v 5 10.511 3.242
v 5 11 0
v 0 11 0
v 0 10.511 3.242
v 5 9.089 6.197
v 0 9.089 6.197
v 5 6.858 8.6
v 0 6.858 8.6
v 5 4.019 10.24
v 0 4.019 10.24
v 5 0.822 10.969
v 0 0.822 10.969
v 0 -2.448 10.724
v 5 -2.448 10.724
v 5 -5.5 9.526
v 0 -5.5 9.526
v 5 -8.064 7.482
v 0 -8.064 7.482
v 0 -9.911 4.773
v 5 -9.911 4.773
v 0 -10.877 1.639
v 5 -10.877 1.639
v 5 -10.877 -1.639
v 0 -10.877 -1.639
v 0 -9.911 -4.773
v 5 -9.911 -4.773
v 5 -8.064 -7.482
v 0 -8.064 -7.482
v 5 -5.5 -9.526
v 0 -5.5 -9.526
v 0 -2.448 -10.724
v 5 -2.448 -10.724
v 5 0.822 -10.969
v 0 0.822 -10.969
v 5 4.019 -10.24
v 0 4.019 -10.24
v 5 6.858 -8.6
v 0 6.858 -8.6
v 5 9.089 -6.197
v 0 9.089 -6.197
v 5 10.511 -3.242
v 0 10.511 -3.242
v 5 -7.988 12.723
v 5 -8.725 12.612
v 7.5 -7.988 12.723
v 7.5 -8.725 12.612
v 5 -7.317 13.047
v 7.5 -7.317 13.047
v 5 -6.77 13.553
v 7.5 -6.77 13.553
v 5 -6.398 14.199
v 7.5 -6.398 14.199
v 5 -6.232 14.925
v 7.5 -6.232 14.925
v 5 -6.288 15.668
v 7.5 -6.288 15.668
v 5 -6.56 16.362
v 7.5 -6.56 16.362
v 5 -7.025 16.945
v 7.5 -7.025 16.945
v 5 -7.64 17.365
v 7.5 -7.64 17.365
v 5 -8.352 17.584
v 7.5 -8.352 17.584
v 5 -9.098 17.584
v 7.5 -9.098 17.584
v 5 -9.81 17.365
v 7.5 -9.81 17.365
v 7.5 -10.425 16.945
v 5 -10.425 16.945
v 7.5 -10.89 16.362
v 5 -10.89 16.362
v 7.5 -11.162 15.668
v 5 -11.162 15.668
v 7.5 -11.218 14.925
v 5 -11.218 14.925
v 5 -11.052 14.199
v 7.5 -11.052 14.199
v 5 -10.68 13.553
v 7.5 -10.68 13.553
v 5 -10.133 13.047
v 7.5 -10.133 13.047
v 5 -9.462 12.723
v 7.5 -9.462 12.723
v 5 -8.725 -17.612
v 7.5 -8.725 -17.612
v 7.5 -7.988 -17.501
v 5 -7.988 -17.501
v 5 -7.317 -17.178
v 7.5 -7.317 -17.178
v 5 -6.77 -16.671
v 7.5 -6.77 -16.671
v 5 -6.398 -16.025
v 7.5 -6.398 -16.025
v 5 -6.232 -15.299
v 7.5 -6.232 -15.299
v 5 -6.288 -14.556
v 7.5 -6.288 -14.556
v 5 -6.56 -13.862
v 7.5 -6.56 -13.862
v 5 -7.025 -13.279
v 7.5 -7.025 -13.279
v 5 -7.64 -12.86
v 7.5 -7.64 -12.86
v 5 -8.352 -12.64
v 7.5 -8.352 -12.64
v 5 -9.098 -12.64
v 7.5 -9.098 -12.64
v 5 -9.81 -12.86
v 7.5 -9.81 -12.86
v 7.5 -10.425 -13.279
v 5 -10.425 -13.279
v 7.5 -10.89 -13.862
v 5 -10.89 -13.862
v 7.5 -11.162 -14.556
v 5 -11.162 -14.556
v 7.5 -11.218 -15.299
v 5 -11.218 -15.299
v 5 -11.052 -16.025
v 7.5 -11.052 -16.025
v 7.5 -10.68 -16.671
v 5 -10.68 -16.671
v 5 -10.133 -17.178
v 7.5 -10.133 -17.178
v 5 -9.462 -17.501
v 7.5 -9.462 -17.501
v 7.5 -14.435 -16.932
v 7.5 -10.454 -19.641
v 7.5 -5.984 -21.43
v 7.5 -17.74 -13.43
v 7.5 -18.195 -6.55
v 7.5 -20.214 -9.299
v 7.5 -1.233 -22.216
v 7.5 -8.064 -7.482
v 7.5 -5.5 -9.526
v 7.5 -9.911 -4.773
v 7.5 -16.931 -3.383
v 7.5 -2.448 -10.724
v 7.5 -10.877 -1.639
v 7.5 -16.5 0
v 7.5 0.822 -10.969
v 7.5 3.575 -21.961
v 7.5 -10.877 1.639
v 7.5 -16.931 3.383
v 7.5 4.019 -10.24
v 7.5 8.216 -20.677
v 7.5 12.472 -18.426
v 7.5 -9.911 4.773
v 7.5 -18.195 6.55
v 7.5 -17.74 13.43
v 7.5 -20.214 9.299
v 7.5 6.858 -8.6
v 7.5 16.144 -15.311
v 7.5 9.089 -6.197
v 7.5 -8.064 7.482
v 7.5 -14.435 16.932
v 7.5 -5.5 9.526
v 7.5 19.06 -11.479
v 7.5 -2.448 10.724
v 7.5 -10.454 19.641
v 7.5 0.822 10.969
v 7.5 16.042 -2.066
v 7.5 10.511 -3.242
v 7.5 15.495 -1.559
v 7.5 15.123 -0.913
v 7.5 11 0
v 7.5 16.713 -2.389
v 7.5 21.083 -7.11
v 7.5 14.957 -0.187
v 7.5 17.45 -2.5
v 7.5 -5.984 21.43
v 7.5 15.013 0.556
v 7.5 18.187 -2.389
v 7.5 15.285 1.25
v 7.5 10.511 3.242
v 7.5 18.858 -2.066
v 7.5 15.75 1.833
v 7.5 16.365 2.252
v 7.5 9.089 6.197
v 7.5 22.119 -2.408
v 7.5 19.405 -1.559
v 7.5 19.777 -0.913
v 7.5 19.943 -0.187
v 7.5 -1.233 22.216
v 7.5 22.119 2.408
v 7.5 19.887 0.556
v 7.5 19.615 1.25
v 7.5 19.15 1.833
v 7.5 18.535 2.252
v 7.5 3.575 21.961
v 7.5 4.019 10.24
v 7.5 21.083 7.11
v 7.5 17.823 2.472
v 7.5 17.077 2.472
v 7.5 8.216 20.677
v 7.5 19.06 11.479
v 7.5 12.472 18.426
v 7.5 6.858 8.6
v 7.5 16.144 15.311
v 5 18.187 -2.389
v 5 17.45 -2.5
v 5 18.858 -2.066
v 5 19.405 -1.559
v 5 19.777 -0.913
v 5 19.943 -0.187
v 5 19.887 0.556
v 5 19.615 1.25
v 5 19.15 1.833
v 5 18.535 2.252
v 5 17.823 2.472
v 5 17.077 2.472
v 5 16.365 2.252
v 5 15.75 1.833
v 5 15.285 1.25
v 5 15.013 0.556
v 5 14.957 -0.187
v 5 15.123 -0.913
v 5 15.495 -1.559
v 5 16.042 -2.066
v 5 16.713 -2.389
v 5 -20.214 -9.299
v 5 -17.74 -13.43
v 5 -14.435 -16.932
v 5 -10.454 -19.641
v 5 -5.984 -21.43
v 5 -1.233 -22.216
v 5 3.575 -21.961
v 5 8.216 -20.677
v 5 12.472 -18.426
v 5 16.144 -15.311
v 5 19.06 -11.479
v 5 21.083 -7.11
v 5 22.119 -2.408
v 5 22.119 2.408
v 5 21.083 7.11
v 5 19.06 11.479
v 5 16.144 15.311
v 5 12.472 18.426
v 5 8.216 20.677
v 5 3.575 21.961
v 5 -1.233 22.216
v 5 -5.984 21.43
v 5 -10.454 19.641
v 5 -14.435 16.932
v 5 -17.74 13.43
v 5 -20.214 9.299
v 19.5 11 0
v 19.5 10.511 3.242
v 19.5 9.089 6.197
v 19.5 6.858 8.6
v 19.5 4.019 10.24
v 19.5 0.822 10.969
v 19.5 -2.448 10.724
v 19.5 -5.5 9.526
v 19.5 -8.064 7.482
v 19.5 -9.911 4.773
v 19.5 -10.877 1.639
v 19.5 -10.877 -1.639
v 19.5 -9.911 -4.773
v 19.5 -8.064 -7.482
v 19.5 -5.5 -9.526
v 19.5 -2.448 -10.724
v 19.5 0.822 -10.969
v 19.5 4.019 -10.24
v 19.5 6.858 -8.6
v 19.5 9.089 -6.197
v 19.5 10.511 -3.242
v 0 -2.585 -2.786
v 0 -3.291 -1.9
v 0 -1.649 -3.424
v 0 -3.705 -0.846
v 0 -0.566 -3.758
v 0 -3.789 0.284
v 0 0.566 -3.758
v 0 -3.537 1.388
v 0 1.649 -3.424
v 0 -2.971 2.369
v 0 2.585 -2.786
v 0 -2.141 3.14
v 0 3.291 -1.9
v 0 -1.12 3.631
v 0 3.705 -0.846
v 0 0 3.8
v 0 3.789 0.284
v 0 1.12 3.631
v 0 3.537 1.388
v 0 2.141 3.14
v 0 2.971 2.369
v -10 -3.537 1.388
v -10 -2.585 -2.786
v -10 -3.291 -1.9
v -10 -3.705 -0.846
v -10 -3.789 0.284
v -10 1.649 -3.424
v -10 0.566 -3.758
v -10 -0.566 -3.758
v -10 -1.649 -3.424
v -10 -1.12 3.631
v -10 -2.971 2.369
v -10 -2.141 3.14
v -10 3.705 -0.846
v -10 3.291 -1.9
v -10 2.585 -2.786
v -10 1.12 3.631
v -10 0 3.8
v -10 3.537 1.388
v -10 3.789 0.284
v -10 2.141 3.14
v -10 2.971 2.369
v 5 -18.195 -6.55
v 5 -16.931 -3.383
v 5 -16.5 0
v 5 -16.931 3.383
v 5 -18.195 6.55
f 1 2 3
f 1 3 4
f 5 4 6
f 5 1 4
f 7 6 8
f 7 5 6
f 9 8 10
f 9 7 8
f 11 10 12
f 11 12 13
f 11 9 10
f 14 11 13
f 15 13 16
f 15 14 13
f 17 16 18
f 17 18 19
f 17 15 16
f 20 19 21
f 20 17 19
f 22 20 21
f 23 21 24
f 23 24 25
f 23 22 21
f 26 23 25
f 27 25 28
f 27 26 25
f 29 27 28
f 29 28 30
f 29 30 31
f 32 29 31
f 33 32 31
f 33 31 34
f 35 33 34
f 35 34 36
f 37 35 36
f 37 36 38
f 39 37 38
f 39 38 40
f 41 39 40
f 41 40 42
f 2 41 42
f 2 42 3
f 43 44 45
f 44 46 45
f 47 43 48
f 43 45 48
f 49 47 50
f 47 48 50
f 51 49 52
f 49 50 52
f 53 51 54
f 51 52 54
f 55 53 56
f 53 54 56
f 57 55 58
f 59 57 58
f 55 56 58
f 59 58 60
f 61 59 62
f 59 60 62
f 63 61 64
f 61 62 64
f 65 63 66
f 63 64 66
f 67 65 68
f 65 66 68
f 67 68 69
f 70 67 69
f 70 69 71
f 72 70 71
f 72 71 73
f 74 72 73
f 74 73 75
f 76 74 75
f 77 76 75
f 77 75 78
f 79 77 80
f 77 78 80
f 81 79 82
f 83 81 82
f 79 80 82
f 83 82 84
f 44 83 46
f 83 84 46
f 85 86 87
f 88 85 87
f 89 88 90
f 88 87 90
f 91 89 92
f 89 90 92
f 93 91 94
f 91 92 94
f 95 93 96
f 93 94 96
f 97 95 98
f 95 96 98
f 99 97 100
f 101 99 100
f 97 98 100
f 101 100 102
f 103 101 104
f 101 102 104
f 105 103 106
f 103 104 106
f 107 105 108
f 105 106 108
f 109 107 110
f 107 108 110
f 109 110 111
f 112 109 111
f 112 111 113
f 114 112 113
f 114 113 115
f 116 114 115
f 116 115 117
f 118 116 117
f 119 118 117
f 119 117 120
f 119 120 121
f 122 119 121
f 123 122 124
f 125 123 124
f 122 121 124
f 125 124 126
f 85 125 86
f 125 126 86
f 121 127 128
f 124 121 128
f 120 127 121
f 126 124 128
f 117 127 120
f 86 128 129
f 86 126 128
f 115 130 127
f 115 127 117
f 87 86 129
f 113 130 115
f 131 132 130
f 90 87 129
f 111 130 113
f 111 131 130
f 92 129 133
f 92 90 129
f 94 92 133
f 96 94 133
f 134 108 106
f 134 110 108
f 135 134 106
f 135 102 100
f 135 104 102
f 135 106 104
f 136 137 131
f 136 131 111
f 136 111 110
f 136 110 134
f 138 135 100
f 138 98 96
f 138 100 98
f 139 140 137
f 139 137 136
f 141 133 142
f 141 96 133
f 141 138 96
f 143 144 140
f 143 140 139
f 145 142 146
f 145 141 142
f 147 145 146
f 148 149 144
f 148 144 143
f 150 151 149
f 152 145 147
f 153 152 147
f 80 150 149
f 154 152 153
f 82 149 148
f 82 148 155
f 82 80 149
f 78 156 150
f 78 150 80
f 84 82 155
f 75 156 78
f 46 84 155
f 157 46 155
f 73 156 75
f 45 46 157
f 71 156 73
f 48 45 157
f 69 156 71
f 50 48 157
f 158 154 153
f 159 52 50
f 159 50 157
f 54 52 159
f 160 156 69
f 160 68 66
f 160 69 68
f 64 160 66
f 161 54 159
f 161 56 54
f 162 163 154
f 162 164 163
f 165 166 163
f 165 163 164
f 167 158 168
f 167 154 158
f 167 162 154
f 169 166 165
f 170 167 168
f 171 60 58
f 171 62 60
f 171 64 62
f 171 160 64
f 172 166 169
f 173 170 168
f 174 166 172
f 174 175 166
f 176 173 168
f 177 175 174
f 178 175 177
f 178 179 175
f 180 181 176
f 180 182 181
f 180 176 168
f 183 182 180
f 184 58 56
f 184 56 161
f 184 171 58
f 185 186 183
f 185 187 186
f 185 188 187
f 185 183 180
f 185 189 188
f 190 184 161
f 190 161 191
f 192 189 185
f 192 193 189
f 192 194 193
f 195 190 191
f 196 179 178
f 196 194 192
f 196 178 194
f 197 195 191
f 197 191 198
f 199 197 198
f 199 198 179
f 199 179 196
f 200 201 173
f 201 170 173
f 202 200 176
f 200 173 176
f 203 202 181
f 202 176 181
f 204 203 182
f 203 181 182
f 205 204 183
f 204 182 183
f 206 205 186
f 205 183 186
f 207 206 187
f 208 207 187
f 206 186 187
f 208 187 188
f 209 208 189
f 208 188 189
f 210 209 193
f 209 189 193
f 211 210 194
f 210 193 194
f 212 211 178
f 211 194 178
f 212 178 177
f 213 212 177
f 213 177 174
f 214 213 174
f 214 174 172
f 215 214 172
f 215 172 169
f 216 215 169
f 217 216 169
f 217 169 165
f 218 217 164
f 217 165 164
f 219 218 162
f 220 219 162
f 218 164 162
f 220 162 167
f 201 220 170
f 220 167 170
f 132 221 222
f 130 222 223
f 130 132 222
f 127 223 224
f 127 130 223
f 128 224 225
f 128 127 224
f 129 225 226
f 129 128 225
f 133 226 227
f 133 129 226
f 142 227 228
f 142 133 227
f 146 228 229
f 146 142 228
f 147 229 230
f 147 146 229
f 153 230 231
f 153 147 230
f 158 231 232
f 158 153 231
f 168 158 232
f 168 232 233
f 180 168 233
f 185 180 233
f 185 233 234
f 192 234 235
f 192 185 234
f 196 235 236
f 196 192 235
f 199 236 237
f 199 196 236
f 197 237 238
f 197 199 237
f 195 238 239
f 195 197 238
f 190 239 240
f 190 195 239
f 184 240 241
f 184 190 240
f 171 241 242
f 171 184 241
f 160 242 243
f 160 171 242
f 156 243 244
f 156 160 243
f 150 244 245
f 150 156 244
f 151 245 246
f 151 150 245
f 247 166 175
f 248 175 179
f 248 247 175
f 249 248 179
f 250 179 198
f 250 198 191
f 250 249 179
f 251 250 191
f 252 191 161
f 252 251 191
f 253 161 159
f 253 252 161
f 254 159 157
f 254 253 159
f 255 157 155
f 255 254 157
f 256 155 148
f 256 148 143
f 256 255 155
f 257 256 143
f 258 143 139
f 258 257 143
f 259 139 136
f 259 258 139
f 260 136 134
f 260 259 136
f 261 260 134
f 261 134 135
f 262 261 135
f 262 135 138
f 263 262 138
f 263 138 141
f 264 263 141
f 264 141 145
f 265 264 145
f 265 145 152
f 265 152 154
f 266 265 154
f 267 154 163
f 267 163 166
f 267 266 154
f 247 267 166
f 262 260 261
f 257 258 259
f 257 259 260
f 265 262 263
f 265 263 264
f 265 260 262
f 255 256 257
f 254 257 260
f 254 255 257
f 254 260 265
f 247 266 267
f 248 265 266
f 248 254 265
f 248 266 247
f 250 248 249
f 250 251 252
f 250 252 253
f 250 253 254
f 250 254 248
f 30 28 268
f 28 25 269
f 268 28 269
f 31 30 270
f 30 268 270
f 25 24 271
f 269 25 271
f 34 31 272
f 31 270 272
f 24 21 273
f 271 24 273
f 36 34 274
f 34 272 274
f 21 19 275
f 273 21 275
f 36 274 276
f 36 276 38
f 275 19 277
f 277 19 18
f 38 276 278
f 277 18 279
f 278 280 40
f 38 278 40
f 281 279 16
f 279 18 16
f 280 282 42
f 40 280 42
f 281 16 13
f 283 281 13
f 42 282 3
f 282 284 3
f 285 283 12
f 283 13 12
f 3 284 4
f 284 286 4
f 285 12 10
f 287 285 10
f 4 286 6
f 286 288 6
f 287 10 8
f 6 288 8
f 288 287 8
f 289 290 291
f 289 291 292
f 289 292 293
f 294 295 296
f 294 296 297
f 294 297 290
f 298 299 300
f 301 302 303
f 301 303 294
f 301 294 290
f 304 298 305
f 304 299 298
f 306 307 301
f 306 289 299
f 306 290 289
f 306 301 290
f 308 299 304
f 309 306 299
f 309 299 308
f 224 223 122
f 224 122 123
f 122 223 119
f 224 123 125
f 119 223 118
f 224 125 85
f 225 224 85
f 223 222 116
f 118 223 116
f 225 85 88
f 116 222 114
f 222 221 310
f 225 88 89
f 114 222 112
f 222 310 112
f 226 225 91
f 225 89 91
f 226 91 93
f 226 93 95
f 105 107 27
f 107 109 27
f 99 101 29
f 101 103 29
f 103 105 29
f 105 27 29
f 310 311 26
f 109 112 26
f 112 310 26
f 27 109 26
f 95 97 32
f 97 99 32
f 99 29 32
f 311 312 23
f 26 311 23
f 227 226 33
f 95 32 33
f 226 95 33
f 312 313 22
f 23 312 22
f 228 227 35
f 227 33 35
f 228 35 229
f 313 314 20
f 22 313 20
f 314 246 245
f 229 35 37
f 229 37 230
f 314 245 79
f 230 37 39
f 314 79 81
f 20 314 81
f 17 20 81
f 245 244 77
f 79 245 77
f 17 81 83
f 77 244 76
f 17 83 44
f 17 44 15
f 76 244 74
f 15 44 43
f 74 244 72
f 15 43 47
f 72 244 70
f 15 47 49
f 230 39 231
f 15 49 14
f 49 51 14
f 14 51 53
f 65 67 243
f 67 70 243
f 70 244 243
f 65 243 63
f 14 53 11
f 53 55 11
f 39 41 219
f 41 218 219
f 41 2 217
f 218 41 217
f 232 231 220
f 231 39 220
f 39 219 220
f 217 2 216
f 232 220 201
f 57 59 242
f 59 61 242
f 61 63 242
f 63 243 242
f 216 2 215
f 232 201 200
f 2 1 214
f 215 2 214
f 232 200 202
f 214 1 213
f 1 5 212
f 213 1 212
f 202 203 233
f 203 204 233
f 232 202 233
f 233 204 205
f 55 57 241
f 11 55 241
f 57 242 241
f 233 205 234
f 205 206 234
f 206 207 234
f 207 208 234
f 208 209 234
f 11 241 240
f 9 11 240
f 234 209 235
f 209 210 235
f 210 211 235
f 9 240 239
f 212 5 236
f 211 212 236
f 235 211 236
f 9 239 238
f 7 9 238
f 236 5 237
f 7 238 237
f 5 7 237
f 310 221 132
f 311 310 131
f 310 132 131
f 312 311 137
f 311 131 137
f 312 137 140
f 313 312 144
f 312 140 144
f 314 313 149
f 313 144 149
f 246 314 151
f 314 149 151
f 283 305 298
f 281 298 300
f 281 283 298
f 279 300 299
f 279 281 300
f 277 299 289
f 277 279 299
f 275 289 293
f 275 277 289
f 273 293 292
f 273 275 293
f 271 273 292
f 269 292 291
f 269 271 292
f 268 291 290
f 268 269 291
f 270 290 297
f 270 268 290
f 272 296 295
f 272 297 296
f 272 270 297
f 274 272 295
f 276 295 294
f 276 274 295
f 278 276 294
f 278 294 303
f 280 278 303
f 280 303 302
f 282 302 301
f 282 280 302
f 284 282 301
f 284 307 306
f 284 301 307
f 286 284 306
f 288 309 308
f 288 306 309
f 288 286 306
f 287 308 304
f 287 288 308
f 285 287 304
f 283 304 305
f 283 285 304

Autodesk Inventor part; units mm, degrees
ref_plane "YZ Plane" through (0, 0, 0) normal (1, 0, 0) x (0, 1, 0)
ref_plane "XZ Plane" through (0, 0, 0) normal (0, 1, 0) x (-1, 0, 0)
ref_plane "XY Plane" through (0, 0, 0) normal (0, 0, 1) x (1, 0, 0)
sketch "Sketch1" plane through (0, 0, 0) normal (0, 0, 1) x (1, 0, 0)
  line L0 (0, 0) -> (0, 3.8)
  line L1 (0, 3.8) -> (0, 3.8)
  line L2 (0, 3.8) -> (0, 11)
  line L3 (0, 11) -> (5, 11)
  line L4 (5, 11) -> (5, 22.25)
  line L5 (5, 22.25) -> (7.5, 22.25)
  line L6 (7.5, 22.25) -> (7.5, 11)
  line L7 (7.5, 11) -> (19.5, 11)
  line L8 (19.5, 11) -> (19.5, 0)
  line L9 (19.5, 0) -> (0, 0)
  line L10 (0, 0) -> (41.6069, 0)
  dimension "d0" = 7.6
  dimension "d1" = 22
  dimension "d2" = 44.5
  dimension "d3" = 0
  dimension "d4" = 5
  dimension "d5" = 12
  dimension "d6" = 2.5
revolve "Revolution1" add sketch "Sketch1" angle 360 about axis through (0, 0, 0) along (1, 0, 0)
sketch "Sketch2" plane through (0, 0, 0) normal (-1, 0, 0) x (0, 0, 1)
  circle A0 centre (0, 0) radius 11 projected
  circle A1 centre (0, 0) radius 3.8
  dimension "d8" = 7.6
extrude "Extrusion1" add sketch "Sketch2" along normal blind 10 contours A1
sketch "Sketch3" plane through (7.5, 0, 0) normal (1, 0, 0) x (0, 0, -1)
  circle A0 centre (0, 0) radius 22.25 projected
  circle A1 centre (0, 17.45) radius 2.5
  circle A2 centre (15.1121, -8.725) radius 2.5
  circle A3 centre (-15.1121, -8.725) radius 2.5
  line L0 (0, 0) -> (0, 17.45) construction
  line L1 (0, 0) -> (15.1121, -8.725) construction
  line L2 (0, 0) -> (-15.1121, -8.725) construction
  dimension "d11" = 5
  dimension "d12" = 17.45
  dimension "d13" = 17.45
  dimension "d14" = 17.45
  dimension "d15" = 5
  dimension "d16" = 5
  dimension "d17" = 120
  dimension "d18" = 120
extrude "Extrusion2" cut sketch "Sketch3" against normal through all contours A1 | A2 | A3
sketch "Sketch4" plane through (7.5, 0, 0) normal (1, 0, 0) x (0, 0, -1)
  circle A0 centre (0, 0) radius 11 projected
  circle A1 centre (0, 0) radius 22.25 projected
  arc A2 (9.2992, -20.2135) -> (-9.2992, -20.2135) centre (0, -30) ccw
  dimension "d21" = 13.5
  dimension "d22" = 30
extrude "Extrusion3" cut sketch "Sketch4" against normal through all contours A2 A1 picked at (-2.0741, -20.1881)
properties part number "Släpring"
